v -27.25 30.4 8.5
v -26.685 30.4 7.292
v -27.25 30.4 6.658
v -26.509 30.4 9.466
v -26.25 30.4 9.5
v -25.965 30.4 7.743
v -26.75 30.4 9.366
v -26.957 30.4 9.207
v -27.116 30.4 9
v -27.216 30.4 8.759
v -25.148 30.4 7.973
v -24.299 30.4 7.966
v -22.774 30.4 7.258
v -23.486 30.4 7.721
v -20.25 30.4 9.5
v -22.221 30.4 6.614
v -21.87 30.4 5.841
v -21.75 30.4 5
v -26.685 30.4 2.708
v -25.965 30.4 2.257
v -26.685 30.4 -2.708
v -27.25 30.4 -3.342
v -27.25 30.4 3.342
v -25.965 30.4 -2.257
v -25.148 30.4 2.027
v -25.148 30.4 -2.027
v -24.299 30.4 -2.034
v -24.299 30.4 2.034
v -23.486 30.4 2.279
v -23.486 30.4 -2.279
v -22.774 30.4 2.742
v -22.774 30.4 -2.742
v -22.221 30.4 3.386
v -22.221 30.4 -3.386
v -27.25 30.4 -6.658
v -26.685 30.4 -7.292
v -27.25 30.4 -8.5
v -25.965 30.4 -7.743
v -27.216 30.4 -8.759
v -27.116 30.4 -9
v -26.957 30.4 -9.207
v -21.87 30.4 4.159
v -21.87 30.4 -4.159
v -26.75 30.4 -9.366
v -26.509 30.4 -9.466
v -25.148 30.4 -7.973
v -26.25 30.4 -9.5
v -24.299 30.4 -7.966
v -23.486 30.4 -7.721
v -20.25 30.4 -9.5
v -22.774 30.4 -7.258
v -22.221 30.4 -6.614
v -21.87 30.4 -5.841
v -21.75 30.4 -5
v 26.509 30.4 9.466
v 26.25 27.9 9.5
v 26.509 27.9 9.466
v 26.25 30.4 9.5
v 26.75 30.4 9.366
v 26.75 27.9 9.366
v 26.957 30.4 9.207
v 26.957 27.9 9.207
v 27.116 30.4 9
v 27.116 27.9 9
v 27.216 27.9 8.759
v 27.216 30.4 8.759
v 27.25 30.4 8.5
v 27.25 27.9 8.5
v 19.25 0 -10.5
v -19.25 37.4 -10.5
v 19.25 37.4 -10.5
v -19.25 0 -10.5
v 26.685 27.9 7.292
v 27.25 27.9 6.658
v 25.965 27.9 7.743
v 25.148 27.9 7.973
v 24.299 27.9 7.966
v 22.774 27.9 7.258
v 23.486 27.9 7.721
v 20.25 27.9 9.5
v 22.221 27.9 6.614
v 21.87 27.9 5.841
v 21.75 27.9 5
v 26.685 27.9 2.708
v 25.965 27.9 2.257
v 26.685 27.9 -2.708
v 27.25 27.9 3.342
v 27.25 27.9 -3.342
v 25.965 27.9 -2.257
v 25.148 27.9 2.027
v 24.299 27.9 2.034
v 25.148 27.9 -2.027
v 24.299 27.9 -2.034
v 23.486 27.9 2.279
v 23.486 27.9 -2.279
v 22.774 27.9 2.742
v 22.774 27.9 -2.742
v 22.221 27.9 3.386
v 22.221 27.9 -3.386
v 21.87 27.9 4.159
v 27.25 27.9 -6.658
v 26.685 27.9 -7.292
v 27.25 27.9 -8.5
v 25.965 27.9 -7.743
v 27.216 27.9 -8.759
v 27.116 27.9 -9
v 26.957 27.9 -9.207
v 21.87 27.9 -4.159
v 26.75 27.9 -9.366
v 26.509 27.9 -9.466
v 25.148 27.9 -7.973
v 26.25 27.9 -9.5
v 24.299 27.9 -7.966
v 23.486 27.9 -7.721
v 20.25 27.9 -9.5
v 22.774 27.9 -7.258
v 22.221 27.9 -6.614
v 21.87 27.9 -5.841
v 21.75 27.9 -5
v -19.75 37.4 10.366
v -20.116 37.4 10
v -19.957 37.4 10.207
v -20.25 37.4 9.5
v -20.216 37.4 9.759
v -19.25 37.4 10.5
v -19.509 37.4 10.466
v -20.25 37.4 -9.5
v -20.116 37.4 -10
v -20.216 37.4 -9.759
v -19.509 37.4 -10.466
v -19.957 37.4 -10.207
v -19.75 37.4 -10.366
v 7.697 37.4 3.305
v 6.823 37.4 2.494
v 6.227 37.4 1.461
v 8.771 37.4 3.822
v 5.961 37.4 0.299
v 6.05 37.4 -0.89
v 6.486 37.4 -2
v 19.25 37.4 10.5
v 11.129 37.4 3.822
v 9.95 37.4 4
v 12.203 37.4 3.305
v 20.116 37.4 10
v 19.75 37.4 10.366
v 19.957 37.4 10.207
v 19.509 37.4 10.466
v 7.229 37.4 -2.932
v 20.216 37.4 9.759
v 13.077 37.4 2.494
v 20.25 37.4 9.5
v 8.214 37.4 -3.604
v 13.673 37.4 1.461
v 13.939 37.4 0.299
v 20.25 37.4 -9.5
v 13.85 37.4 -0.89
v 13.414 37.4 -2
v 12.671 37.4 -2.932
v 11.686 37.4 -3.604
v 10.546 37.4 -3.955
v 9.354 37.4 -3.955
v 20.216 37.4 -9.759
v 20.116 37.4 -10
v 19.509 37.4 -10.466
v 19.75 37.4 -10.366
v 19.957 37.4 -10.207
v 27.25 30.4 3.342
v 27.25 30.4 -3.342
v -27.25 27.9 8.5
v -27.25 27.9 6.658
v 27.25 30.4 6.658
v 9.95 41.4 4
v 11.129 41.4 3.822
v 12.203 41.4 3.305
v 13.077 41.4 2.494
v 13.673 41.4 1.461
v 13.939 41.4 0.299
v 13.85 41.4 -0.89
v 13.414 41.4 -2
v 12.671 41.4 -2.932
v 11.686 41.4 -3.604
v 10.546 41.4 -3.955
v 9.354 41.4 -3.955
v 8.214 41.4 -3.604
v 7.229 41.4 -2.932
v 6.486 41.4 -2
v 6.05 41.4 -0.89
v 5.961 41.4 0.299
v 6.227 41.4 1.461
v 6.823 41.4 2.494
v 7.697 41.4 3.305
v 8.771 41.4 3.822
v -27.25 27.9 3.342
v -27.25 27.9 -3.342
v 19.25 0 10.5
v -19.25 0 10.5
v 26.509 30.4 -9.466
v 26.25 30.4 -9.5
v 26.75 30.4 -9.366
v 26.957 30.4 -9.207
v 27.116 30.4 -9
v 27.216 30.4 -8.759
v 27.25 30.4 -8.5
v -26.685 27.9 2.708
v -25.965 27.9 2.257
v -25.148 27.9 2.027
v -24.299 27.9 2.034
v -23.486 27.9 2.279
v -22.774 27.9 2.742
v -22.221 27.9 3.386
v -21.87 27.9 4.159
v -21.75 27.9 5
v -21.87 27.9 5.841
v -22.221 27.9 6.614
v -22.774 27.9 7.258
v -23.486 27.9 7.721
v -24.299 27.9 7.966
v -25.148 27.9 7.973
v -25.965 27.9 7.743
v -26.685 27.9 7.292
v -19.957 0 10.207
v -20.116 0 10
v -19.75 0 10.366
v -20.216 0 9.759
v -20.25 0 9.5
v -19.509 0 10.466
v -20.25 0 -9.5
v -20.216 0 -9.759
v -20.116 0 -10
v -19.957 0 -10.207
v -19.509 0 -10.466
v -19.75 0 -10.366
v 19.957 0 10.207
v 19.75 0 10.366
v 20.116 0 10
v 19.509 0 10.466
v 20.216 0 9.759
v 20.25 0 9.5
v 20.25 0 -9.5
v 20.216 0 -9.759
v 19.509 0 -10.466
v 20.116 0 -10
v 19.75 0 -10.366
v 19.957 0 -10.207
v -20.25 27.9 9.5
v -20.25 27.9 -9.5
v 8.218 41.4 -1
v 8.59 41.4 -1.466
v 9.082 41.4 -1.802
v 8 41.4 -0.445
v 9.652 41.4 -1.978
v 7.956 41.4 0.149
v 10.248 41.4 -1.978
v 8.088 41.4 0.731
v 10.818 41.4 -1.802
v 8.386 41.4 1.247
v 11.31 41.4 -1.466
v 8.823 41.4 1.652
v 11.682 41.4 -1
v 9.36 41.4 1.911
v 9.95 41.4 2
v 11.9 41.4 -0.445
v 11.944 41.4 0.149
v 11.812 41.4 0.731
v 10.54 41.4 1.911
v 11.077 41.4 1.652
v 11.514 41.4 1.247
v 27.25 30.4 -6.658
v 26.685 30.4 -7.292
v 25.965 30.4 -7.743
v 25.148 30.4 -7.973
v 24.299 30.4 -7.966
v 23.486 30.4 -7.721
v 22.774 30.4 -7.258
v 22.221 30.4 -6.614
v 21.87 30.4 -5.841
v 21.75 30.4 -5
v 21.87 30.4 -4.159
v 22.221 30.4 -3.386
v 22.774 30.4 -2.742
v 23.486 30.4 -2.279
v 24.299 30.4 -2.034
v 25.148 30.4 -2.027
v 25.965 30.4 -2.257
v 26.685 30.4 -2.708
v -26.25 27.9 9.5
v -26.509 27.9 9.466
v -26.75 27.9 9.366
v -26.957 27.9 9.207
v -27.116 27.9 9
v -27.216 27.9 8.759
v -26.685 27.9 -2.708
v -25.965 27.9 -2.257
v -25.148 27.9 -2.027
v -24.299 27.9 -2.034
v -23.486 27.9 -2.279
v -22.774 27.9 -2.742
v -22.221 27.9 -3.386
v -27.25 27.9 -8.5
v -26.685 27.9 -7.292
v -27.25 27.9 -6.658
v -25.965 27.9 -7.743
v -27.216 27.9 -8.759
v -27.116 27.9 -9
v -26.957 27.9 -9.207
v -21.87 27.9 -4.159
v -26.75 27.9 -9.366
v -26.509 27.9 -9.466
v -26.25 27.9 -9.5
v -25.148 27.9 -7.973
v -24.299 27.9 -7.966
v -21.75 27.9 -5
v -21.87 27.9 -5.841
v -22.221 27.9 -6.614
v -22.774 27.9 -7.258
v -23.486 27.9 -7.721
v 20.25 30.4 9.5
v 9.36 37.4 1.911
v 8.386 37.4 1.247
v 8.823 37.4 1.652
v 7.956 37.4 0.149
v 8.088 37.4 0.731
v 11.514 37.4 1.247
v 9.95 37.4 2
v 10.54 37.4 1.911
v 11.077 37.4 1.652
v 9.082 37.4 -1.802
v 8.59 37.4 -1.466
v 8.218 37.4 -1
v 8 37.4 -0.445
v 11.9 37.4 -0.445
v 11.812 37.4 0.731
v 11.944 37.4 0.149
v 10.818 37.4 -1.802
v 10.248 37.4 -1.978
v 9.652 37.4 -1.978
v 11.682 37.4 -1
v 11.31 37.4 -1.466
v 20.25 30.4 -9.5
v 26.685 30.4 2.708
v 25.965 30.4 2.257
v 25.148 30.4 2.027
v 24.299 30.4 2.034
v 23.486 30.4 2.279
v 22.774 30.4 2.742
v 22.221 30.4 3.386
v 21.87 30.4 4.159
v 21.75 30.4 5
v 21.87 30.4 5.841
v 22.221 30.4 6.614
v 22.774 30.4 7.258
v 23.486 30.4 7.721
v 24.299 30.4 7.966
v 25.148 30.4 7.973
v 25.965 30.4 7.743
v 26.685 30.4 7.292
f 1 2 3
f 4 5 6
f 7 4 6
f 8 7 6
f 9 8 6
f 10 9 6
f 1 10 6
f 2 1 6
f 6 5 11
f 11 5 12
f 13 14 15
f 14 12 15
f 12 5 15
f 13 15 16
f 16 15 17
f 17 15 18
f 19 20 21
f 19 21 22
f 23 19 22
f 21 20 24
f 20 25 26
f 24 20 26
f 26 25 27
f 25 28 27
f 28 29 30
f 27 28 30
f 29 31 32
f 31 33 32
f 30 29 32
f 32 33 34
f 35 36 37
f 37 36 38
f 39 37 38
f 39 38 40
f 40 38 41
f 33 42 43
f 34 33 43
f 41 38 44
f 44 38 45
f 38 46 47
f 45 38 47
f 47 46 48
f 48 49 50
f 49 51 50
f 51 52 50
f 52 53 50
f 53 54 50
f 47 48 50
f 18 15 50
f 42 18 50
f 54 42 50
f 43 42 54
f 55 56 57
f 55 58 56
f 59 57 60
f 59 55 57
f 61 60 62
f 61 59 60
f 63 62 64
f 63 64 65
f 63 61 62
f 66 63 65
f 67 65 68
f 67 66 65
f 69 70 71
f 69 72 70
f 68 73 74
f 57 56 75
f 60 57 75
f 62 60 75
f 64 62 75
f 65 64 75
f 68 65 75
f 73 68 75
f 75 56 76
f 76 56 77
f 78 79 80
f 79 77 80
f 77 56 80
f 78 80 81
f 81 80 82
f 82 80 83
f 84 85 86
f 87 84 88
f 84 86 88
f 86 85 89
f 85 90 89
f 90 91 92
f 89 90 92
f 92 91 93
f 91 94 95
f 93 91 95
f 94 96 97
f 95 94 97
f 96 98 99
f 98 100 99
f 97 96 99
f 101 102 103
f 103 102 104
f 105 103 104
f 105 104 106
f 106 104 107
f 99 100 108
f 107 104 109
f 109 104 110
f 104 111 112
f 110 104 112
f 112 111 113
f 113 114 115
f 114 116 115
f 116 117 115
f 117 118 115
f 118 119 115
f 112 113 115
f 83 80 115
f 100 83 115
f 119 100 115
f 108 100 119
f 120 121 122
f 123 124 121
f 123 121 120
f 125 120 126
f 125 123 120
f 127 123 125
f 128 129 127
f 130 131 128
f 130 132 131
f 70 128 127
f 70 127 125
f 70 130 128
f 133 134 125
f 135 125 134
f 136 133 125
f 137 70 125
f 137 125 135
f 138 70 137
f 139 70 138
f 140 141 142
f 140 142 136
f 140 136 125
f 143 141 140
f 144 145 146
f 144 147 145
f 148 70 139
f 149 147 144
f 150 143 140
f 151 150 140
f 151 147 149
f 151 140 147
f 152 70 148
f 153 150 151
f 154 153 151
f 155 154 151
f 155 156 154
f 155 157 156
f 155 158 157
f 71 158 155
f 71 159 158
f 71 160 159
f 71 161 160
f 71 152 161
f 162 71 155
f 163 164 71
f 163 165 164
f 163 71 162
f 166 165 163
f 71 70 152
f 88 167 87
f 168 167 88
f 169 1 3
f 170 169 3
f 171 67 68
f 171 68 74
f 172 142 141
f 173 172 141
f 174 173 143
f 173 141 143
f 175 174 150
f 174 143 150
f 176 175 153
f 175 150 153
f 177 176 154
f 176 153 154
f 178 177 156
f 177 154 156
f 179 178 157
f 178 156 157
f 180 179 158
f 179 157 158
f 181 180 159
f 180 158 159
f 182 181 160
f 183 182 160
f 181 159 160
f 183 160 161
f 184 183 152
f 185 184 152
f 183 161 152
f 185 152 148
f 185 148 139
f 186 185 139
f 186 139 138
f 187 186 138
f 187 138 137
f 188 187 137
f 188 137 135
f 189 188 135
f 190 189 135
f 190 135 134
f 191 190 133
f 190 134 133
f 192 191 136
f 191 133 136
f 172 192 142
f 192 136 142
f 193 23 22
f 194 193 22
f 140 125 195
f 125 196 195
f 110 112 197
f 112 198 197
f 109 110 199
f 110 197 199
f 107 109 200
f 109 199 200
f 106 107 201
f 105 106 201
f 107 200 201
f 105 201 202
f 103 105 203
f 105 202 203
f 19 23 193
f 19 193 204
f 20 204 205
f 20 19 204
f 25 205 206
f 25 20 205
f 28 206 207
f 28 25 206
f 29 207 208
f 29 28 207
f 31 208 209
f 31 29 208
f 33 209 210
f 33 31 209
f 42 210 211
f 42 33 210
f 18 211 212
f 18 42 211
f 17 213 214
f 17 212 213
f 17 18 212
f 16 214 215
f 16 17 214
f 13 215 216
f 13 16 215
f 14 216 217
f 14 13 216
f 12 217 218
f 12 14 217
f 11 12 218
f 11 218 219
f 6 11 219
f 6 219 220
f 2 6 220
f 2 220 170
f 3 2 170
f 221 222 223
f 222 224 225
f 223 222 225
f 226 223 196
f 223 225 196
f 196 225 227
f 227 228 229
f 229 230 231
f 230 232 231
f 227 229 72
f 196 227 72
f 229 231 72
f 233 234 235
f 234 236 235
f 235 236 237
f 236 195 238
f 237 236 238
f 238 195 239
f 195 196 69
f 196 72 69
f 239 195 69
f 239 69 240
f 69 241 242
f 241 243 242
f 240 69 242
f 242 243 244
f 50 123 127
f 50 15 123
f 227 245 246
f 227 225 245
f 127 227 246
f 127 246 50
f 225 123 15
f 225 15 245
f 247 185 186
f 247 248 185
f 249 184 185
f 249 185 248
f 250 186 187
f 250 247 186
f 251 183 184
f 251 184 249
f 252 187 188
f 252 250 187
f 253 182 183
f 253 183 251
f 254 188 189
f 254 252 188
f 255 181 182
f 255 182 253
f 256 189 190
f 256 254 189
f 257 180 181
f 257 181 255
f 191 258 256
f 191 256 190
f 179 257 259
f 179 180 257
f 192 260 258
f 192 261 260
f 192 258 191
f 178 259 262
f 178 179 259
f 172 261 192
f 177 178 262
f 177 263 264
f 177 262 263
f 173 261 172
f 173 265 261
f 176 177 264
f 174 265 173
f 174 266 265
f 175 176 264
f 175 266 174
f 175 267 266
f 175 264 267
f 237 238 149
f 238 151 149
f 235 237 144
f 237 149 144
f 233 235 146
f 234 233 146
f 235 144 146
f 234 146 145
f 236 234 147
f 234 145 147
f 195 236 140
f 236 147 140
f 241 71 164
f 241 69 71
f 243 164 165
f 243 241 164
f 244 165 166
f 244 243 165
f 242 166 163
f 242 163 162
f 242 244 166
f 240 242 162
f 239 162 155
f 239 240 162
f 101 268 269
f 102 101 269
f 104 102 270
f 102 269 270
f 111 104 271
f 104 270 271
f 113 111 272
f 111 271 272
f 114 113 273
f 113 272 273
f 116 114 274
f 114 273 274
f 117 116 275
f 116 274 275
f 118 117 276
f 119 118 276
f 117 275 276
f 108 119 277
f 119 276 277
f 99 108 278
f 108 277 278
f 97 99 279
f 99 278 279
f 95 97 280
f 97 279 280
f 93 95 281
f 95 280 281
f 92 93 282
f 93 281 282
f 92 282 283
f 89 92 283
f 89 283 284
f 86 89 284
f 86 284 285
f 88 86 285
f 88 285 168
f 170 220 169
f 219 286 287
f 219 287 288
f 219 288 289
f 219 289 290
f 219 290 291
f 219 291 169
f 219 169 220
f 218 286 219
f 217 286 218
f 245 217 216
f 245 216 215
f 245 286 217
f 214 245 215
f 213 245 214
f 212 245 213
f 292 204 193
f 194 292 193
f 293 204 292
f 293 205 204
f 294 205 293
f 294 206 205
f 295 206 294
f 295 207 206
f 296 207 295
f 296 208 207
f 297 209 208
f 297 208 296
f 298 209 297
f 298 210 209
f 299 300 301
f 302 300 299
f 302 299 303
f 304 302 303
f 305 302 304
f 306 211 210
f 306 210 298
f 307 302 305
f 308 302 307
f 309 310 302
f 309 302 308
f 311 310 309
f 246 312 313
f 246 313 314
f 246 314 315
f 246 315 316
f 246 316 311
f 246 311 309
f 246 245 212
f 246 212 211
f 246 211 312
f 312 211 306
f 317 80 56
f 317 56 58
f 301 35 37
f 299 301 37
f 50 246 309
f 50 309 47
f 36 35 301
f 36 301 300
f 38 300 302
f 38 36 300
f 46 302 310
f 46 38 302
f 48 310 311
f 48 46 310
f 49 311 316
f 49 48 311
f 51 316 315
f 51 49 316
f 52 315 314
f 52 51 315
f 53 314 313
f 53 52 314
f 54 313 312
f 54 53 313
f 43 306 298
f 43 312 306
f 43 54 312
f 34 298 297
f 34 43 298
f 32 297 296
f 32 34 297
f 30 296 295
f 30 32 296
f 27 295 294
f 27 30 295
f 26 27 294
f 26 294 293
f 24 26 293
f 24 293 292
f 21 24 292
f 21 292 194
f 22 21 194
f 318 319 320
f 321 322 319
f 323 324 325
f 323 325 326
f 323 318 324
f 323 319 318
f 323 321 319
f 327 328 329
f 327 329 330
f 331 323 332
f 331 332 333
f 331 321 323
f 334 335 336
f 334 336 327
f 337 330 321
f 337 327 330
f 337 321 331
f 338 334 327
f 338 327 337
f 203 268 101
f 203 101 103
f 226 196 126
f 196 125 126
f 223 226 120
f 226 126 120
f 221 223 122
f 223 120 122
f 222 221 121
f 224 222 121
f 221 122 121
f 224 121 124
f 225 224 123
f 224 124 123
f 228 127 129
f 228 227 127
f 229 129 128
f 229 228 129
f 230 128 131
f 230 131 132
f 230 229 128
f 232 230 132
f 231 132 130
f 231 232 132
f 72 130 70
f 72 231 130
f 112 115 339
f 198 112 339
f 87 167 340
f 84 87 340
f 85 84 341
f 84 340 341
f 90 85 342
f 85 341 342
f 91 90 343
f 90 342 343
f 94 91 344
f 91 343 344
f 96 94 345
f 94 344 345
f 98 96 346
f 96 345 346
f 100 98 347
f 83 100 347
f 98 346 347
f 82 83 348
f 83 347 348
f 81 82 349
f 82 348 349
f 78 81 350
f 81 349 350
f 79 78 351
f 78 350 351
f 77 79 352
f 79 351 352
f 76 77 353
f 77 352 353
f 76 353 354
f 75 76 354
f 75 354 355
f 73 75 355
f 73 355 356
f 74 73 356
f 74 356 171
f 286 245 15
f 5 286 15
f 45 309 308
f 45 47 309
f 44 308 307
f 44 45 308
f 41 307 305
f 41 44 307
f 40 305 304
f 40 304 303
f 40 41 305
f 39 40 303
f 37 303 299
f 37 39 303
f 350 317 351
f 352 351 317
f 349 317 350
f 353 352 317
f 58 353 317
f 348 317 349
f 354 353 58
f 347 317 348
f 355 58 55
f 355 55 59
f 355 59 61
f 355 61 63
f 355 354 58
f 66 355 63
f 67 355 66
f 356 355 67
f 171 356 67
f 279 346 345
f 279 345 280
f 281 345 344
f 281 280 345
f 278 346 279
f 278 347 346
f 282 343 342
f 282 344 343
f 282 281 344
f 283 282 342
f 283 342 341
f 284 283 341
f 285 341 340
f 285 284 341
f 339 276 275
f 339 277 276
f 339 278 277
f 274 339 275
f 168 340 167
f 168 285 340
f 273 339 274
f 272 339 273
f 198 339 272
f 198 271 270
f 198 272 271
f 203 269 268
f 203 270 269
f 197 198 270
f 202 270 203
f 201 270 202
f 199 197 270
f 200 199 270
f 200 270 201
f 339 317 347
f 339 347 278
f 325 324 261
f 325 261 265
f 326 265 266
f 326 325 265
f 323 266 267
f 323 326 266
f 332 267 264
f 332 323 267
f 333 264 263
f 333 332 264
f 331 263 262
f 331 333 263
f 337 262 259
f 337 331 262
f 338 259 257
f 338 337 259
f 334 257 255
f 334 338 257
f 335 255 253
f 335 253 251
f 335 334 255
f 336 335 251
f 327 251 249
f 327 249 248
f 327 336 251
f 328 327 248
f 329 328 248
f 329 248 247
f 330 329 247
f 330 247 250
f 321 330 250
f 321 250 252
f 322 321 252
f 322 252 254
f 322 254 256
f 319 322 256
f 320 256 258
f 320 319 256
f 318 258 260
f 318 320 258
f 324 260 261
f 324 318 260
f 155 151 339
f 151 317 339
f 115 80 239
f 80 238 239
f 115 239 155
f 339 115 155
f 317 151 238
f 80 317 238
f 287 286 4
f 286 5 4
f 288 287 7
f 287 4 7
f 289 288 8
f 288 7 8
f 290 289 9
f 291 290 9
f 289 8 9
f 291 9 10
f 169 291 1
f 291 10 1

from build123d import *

# Parameters (mm, degrees)
SKETCH_1_W          = 40.5
SKETCH_1_H          = 21
EXTRUDE_1_DEPTH     = 30.4
SKETCH_2_W          = 19
SKETCH_2_H          = 2.5
EXTRUDE_2_DEPTH     = 7
SKETCH_3_W          = 40.5
SKETCH_3_H          = 21
EXTRUDE_3_DEPTH     = 7
SKETCH_4_R          = 3
CUT_EXTRUDE_1_DEPTH = 7
SKETCH_5_R          = 4
SKETCH_5_R_2        = 2
EXTRUDE_4_DEPTH     = 4
FILLET_1_R          = 1
FILLET_2_R          = 1
FILLET_3_R          = 1
FILLET_4_R          = 1
FILLET_5_R          = 1
FILLET_6_R          = 1
FILLET_7_R          = 1
FILLET_8_R          = 1


with BuildPart() as part:
    # 草图1 → 凸台-拉伸1 (new body)
    with BuildSketch(Plane(origin=(0, 0, 0), x_dir=(1, 0, 0), z_dir=(0, 1, 0))):
        Rectangle(SKETCH_1_W, SKETCH_1_H)
    extrude(amount=EXTRUDE_1_DEPTH)

    # 草图2 → 凸台-拉伸2 (add)
    with BuildSketch(Plane(origin=(20.25, 0, 0), x_dir=(0, 0, -1), z_dir=(1, 0, 0))):
        with Locations((0, 29.15)):
            Rectangle(SKETCH_2_W, SKETCH_2_H)
    extrude_2 = extrude(amount=EXTRUDE_2_DEPTH)

    # 草图3 → 凸台-拉伸3 (add)
    with BuildSketch(Plane(origin=(0, 30.4, 0), x_dir=(1, 0, 0), z_dir=(0, 1, 0))):
        Rectangle(SKETCH_3_W, SKETCH_3_H)
    extrude(amount=EXTRUDE_3_DEPTH)

    # 草图4 → 切除-拉伸1 (cut)
    with BuildSketch(Plane(origin=(0, 30.4, 0), x_dir=(1, 0, 0), z_dir=(0, 1, 0))):
        with Locations((24.75, 5)):
            Circle(SKETCH_4_R)
        with Locations((24.75, -5)):
            Circle(SKETCH_4_R)
    cut_extrude_1 = extrude(amount=-CUT_EXTRUDE_1_DEPTH, mode=Mode.SUBTRACT)

    # 草图5 → 凸台-拉伸4 (add)
    with BuildSketch(Plane(origin=(0, 37.4, 0), x_dir=(1, 0, 0), z_dir=(0, 1, 0))):
        with Locations(Location((9.95, 0, 0), (0, 0, 270))):
            Circle(SKETCH_5_R)
        with Locations(Location((9.95, 0, 0), (0, 0, 270))):
            Circle(SKETCH_5_R_2, mode=Mode.SUBTRACT)
    extrude(amount=EXTRUDE_4_DEPTH)

    # 镜向2: 凸台-拉伸2, 切除-拉伸1 across plane
    add(extrude_2.mirror(Plane(origin=(0, 0, 0), x_dir=(0, 0, 1), z_dir=(1, 0, 0))))
    add(cut_extrude_1.mirror(Plane(origin=(0, 0, 0), x_dir=(0, 0, 1), z_dir=(1, 0, 0))), mode=Mode.SUBTRACT)

    # 圆角1
    fillet_1_edges = [part.edges().sort_by_distance(p)[0] for p in [
        (20.25, 18.7, -10.5),
    ]]
    fillet(fillet_1_edges, radius=FILLET_1_R - 0.0001)  # a hair under: the kernel refuses the full size

    # 圆角2
    fillet_2_edges = [part.edges().sort_by_distance(p)[0] for p in [
        (20.25, 18.7, 10.5),
    ]]
    fillet(fillet_2_edges, radius=FILLET_2_R - 0.0001)  # a hair under: the kernel refuses the full size

    # 圆角3
    fillet_3_edges = [part.edges().sort_by_distance(p)[0] for p in [
        (-20.25, 18.7, 10.5),
    ]]
    fillet(fillet_3_edges, radius=FILLET_3_R - 0.0001)  # a hair under: the kernel refuses the full size

    # 圆角4
    fillet_4_edges = [part.edges().sort_by_distance(p)[0] for p in [
        (-20.25, 18.7, -10.5),
    ]]
    fillet(fillet_4_edges, radius=FILLET_4_R - 0.0001)  # a hair under: the kernel refuses the full size

    # 圆角5
    fillet_5_edges = [part.edges().sort_by_distance(p)[0] for p in [
        (-27.25, 29.15, -9.5),
    ]]
    fillet(fillet_5_edges, radius=FILLET_5_R)

    # 圆角6
    fillet_6_edges = [part.edges().sort_by_distance(p)[0] for p in [
        (-27.25, 29.15, 9.5),
    ]]
    fillet(fillet_6_edges, radius=FILLET_6_R)

    # 圆角7
    fillet_7_edges = [part.edges().sort_by_distance(p)[0] for p in [
        (27.25, 29.15, 9.5),
    ]]
    fillet(fillet_7_edges, radius=FILLET_7_R)

    # 圆角8
    fillet_8_edges = [part.edges().sort_by_distance(p)[0] for p in [
        (27.25, 29.15, -9.5),
    ]]
    fillet(fillet_8_edges, radius=FILLET_8_R)


solid = part.part
